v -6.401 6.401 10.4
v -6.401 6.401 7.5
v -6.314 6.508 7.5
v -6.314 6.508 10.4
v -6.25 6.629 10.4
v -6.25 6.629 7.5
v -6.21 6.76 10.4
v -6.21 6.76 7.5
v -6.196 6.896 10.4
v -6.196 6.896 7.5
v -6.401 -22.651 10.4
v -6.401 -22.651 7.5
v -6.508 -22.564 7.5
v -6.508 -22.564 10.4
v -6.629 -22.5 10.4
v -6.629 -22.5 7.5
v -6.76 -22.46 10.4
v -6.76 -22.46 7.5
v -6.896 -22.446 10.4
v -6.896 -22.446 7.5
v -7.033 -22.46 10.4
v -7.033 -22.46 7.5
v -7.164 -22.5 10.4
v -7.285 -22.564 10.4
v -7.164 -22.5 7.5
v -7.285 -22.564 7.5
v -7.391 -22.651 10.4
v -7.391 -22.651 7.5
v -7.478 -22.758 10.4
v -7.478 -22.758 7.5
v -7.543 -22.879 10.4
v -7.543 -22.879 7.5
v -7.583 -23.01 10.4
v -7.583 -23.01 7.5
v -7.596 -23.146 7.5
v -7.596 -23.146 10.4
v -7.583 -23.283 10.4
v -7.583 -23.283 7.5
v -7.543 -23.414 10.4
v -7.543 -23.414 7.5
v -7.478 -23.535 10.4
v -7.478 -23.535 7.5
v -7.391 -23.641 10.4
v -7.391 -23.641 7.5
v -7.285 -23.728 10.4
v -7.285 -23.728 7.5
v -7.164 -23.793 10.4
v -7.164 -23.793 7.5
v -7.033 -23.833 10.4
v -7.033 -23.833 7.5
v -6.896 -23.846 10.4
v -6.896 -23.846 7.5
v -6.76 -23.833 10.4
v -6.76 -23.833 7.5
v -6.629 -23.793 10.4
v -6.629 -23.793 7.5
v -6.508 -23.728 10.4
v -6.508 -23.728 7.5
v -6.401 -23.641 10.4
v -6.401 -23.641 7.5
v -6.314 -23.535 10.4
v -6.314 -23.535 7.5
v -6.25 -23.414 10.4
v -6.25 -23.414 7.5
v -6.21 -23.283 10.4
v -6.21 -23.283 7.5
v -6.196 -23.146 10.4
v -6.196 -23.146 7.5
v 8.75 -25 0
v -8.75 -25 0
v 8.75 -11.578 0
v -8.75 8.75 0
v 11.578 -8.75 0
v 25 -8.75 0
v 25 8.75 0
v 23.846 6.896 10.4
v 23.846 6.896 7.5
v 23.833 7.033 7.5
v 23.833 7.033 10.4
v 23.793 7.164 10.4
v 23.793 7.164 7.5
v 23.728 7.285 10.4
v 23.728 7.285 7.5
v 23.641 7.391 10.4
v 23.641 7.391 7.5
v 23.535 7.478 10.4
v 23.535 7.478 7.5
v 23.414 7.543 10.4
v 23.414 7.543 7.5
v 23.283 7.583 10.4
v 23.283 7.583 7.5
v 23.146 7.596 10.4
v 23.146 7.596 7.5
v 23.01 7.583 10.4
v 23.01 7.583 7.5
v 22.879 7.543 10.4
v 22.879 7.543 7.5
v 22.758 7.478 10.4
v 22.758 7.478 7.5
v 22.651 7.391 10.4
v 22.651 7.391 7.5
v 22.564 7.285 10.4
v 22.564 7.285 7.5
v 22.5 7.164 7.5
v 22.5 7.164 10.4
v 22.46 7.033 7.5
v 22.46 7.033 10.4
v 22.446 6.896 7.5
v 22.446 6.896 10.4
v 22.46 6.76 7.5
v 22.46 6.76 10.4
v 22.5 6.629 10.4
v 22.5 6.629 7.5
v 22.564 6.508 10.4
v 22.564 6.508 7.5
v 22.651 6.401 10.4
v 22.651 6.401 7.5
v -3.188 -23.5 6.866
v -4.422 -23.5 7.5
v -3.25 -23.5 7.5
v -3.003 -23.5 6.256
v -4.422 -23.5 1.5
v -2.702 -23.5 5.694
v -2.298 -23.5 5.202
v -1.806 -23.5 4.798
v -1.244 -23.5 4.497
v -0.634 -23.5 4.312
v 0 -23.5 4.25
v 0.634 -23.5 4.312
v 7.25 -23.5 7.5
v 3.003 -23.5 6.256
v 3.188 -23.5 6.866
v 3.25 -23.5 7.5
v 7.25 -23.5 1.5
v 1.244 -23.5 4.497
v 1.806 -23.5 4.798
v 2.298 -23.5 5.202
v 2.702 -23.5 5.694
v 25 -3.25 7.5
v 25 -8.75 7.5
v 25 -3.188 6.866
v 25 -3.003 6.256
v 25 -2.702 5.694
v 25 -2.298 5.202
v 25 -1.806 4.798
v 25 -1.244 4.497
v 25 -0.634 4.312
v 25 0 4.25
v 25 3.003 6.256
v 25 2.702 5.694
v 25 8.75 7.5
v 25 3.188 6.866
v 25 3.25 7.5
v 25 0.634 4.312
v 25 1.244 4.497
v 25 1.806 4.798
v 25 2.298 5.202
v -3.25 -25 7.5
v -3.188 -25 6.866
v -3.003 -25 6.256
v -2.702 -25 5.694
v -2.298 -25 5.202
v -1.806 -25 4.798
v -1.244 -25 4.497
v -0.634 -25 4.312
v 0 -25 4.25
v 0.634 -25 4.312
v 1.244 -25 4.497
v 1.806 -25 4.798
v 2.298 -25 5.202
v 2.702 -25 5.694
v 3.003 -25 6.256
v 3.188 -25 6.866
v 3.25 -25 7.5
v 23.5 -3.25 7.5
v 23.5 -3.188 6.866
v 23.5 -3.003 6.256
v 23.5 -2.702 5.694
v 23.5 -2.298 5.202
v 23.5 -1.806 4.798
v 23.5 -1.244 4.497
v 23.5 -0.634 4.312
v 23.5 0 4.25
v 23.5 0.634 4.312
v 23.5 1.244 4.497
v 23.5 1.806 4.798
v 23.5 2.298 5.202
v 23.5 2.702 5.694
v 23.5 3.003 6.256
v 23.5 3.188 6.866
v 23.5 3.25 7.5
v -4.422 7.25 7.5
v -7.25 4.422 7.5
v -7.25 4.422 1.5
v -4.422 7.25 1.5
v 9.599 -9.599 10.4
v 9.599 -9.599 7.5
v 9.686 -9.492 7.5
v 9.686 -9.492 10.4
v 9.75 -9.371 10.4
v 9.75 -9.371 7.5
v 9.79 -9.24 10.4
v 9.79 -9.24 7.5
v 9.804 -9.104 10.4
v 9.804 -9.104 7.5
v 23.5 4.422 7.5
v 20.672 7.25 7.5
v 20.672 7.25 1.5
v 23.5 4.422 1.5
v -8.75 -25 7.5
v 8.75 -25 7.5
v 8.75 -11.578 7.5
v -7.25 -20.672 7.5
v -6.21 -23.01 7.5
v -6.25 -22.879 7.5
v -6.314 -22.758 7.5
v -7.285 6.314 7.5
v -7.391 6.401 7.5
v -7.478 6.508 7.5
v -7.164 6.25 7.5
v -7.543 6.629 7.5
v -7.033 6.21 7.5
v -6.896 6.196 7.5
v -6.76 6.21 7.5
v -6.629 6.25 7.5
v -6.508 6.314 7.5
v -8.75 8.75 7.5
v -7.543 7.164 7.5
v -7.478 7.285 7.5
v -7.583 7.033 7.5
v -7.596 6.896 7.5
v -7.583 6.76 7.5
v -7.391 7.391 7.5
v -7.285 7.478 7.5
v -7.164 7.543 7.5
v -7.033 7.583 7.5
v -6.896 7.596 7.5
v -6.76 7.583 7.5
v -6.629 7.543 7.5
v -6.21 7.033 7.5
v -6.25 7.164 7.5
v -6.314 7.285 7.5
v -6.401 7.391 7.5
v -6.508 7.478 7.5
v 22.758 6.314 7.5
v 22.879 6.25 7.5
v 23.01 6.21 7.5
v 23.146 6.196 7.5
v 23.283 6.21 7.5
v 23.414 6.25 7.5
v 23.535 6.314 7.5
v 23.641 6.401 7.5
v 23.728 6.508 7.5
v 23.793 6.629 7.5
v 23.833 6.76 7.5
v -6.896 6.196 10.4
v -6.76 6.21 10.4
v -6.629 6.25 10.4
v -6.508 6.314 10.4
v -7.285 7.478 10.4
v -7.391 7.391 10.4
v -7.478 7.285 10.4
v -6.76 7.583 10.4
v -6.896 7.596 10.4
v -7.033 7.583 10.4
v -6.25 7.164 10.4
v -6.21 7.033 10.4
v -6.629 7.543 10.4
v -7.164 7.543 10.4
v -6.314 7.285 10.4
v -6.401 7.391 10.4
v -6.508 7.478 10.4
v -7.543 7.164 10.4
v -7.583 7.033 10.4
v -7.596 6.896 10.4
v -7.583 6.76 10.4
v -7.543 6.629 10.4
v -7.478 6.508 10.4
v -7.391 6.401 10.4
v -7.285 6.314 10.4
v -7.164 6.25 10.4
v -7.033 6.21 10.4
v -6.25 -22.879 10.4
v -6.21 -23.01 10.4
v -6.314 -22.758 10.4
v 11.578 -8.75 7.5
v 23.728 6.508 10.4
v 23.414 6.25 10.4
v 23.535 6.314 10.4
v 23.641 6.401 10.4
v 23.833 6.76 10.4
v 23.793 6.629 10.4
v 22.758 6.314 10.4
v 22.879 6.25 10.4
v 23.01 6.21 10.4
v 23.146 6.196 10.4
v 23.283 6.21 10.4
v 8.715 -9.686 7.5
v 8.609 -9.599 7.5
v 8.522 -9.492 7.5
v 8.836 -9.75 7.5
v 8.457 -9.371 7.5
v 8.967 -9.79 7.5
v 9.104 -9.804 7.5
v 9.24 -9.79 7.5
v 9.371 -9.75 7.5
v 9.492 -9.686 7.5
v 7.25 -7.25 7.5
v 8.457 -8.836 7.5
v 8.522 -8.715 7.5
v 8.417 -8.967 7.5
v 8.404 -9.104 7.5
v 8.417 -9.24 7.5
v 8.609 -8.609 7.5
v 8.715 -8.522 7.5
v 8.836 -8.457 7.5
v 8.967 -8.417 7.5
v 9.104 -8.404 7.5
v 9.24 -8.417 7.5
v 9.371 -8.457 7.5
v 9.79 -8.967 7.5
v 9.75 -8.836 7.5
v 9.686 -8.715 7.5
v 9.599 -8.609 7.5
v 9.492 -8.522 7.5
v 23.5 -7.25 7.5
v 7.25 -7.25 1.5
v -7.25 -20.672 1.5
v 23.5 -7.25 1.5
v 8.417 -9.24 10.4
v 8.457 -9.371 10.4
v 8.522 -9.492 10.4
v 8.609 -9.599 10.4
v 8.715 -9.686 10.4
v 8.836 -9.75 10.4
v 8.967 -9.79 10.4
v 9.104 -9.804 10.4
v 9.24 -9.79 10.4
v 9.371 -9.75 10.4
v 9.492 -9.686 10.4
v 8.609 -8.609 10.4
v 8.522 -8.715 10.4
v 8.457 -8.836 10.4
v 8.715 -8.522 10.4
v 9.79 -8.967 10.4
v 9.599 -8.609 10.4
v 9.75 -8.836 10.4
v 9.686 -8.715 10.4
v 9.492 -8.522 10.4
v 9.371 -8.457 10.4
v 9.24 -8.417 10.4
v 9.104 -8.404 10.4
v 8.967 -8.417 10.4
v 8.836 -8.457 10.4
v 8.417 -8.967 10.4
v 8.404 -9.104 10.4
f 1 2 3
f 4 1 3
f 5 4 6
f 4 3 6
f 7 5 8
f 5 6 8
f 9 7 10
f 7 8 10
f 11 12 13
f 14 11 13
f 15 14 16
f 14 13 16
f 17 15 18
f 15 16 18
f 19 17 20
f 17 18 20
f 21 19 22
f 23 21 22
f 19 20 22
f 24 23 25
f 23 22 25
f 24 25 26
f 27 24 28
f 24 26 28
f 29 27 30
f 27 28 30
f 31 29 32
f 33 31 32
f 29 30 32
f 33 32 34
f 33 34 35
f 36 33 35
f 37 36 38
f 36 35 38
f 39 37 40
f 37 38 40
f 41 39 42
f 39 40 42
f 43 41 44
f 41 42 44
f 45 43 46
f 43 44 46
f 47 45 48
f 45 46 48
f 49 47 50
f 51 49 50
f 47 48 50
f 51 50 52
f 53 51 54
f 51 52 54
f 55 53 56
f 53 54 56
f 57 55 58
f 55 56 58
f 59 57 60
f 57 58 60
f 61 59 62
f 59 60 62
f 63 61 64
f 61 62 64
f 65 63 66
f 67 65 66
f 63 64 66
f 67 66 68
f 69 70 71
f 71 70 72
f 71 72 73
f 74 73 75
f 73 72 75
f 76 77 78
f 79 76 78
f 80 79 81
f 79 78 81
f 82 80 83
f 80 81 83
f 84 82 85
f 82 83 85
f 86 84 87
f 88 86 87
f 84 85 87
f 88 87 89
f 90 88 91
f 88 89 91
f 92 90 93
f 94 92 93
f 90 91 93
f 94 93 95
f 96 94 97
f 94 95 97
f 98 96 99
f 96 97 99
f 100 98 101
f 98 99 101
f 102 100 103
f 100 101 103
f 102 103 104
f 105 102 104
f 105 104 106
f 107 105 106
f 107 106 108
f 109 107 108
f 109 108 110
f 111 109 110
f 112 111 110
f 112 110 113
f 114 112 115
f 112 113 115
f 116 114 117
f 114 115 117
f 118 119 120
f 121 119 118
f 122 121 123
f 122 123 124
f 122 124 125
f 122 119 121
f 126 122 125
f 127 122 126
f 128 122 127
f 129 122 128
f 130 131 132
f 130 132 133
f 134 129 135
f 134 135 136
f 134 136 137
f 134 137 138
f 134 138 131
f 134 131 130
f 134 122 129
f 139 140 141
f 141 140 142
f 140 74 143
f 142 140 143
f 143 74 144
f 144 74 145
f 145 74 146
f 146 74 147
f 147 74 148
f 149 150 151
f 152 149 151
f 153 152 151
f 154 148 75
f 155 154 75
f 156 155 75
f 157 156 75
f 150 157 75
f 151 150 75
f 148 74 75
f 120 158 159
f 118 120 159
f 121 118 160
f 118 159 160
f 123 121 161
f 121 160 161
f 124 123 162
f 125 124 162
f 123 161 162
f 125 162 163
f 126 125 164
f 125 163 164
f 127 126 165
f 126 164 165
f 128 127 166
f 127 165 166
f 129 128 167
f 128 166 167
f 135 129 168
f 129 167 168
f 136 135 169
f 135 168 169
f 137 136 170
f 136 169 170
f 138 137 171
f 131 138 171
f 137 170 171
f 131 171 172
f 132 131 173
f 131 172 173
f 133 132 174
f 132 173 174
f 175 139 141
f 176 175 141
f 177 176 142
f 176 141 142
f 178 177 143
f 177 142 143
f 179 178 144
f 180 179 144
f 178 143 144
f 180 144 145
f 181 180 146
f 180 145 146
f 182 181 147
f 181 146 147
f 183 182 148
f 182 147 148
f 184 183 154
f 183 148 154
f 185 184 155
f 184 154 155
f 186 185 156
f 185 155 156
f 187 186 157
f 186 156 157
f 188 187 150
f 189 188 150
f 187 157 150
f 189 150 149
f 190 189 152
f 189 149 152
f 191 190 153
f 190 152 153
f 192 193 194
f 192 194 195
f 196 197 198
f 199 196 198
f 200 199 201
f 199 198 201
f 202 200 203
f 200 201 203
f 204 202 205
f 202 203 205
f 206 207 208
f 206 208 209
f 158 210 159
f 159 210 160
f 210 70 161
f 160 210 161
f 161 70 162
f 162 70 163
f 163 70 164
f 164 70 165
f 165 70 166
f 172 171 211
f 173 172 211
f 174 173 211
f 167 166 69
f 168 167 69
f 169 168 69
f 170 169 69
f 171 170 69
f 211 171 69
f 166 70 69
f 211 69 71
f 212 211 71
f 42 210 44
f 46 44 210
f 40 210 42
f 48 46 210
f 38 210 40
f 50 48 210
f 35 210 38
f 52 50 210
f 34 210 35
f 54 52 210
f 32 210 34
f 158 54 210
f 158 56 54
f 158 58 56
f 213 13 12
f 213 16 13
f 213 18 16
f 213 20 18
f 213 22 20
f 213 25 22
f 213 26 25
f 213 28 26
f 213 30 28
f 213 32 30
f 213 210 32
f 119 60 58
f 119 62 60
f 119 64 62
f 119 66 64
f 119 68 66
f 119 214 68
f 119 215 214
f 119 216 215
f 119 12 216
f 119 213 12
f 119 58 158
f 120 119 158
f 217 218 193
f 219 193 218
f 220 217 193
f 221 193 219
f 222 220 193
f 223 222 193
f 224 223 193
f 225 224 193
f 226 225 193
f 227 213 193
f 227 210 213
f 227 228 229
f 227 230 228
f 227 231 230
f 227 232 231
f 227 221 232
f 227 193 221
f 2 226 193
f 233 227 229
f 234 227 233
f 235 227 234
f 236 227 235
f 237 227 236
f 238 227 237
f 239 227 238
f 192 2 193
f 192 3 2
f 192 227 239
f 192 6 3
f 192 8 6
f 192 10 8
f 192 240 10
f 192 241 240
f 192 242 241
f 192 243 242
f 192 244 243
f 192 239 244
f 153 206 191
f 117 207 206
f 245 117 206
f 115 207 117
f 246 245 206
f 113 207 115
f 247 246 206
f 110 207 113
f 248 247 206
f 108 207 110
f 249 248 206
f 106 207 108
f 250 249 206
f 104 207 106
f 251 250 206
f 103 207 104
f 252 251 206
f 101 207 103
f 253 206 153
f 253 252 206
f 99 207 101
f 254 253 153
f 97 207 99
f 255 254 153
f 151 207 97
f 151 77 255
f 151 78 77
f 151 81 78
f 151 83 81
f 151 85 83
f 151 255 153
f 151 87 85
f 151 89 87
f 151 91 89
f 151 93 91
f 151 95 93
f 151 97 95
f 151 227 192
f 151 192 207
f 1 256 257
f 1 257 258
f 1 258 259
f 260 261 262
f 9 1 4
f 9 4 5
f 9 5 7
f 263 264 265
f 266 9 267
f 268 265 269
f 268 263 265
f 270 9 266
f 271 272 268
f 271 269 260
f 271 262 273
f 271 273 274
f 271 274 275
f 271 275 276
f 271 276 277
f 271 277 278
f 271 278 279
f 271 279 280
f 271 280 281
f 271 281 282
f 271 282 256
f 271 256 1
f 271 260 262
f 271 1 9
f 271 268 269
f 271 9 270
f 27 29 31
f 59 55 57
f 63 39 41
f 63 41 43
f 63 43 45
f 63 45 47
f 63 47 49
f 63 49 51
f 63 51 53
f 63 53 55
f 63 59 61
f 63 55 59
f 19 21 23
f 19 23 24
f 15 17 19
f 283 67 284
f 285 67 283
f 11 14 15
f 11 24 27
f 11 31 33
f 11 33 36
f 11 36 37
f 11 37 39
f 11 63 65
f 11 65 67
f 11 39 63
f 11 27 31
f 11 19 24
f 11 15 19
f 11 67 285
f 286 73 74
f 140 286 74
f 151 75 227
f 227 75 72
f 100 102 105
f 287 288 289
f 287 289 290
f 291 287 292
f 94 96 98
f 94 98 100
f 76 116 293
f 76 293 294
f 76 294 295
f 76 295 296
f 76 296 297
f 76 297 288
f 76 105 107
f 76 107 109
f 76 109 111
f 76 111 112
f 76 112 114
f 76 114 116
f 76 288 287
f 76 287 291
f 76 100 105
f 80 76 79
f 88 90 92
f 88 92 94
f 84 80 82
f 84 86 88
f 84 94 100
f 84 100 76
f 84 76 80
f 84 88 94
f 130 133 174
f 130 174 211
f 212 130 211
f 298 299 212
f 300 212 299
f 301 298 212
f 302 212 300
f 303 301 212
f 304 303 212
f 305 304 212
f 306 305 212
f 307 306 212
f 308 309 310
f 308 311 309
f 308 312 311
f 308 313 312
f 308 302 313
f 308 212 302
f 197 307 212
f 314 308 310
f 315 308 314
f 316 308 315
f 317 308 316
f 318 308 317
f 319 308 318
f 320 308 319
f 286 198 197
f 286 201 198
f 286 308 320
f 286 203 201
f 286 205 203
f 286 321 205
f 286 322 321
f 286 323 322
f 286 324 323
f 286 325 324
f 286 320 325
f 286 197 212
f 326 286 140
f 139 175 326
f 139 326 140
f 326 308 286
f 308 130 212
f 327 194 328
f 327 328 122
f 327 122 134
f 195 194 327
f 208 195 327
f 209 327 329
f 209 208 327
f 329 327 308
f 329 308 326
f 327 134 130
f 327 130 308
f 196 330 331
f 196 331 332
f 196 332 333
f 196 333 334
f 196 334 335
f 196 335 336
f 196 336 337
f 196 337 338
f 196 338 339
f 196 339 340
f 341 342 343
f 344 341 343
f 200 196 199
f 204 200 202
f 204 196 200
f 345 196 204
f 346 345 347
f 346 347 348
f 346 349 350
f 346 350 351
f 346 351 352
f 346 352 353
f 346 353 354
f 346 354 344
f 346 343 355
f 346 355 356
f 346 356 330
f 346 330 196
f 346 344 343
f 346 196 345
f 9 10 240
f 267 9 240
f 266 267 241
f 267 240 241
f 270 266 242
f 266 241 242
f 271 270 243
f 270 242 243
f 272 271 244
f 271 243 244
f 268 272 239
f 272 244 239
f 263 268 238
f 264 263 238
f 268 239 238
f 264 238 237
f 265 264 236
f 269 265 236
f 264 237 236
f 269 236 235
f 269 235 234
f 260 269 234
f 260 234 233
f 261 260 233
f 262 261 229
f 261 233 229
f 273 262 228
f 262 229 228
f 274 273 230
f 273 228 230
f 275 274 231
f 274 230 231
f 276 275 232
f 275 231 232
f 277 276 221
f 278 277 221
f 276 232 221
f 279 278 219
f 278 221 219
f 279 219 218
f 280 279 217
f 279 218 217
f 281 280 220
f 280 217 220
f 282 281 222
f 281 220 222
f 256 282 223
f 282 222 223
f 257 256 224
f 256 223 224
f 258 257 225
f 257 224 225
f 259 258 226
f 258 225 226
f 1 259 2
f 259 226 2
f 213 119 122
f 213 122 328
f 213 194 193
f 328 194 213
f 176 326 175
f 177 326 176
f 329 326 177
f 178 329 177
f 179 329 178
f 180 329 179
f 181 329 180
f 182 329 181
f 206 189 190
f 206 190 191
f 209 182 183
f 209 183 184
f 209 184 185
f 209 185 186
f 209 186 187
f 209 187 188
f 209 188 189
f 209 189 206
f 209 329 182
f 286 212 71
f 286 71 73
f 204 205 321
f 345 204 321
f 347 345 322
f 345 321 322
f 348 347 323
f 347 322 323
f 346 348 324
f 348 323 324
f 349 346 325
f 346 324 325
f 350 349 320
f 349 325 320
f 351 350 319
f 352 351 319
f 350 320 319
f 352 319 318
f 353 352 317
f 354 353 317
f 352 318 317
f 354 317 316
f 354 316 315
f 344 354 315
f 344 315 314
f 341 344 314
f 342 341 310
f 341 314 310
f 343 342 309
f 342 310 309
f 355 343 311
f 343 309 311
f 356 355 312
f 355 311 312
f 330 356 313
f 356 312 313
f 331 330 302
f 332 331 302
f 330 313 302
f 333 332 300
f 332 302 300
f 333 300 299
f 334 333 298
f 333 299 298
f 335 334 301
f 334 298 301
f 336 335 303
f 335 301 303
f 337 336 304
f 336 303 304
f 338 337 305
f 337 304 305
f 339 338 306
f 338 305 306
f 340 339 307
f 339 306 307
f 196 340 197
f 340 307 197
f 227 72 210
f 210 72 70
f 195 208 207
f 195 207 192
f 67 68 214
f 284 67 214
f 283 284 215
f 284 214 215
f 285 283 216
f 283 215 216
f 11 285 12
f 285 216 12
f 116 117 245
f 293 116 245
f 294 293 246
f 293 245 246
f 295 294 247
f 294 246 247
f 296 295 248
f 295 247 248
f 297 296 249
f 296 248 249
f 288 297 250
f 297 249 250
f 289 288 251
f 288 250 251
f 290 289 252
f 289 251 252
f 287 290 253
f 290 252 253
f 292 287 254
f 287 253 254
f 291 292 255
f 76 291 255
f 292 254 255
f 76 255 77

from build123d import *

# Parameters (mm, degrees)
F0_W      = 8.75
F0_H      = 8.75
F1_DEPTH  = 7.5
F2_T      = -1.5
F4_DEPTH  = 7.5
F6_DEPTH  = 2.9
F7_R      = 3.25
F8_DEPTH  = 32.25
F9_R      = 3.25
F10_DEPTH = 32.25


with BuildPart() as f1:
    # F0 (on Top) → F1 (new body)
    with BuildSketch(Plane.XY):
        Polygon((25, 0), (25, 8.75), (8.75, 8.75), (0, 8.75), (0, 0), align=None)
        Polygon((25, -8.75), (25, 0), (0, 0), (0, -25), (8.75, -25), (8.75, -8.75), align=None)
        with Locations((-4.375, 4.375)):
            Rectangle(F0_W, F0_H)
        Polygon((0, -25), (0, 0), (-8.75, 0), (-8.75, -8.75), (-8.75, -25), align=None)
    extrude(amount=F1_DEPTH)

    # F2
    f2_openings = [f1.faces().sort_by_distance(p)[0] for p in [
        (5.484375, -5.484375, 7.5),
    ]]
    offset(amount=F2_T, openings=f2_openings, kind=Kind.INTERSECTION)

    # F3 (on face) → F4 (join, through all)
    with BuildSketch(Plane.XY.offset(7.5)):
        Polygon((-4.4215728753, 7.25), (-7.25, 7.25), (-7.25, 4.4215728753), align=None)
        Polygon((11.5784271247, -8.75), (8.75, -8.75), (8.75, -11.5784271247), align=None)
        Polygon((23.5, 7.25), (20.6715728753, 7.25), (23.5, 4.4215728753), align=None)
        Polygon((-4.4215728753, -23.5), (-7.25, -20.6715728753), (-7.25, -23.5), align=None)
    extrude(amount=-F4_DEPTH)

    # F5 (on face) → F6 (join)
    with BuildSketch(Plane.XY.offset(7.5)):
        with BuildLine():
            ThreePointArc((-6.4014718626, 6.4014718626), (-6.2497309366, 6.6285682068), (-6.1964466094, 6.8964466094))
            ThreePointArc((-6.1964466094, 6.8964466094), (-7.5431622822, 7.1643250121), (-6.4014718626, 6.4014718626))
        make_face()
        with BuildLine():
            ThreePointArc((22.6514718626, 6.4014718626), (23.4143250121, 6.2497309366), (23.8464466094, 6.8964466094))
            ThreePointArc((23.8464466094, 6.8964466094), (22.8785682068, 7.5431622822), (22.6514718626, 6.4014718626))
        make_face()
        with BuildLine():
            ThreePointArc((9.5985281374, -9.5985281374), (9.7502690634, -9.3714317932), (9.8035533906, -9.1035533906))
            ThreePointArc((9.8035533906, -9.1035533906), (8.4568377178, -8.8356749879), (9.5985281374, -9.5985281374))
        make_face()
        with BuildLine():
            ThreePointArc((-6.4014718626, -22.6514718626), (-7.5431622822, -23.4143250121), (-6.1964466094, -23.1464466094))
            ThreePointArc((-6.1964466094, -23.1464466094), (-6.2497309366, -22.8785682068), (-6.4014718626, -22.6514718626))
        make_face()
    extrude(amount=F6_DEPTH)

    # F7 (on face) → F8 (cut, through all)
    with BuildSketch(Plane.XZ.offset(25)):
        with Locations((0, 7.5)):
            Circle(F7_R)
    extrude(amount=-F8_DEPTH, mode=Mode.SUBTRACT)

    # F9 (on face) → F10 (cut, through all)
    with BuildSketch(Plane.YZ.offset(25)):
        with Locations((0, 7.5)):
            Circle(F9_R)
    extrude(amount=-F10_DEPTH, mode=Mode.SUBTRACT)


solid = f1.part
